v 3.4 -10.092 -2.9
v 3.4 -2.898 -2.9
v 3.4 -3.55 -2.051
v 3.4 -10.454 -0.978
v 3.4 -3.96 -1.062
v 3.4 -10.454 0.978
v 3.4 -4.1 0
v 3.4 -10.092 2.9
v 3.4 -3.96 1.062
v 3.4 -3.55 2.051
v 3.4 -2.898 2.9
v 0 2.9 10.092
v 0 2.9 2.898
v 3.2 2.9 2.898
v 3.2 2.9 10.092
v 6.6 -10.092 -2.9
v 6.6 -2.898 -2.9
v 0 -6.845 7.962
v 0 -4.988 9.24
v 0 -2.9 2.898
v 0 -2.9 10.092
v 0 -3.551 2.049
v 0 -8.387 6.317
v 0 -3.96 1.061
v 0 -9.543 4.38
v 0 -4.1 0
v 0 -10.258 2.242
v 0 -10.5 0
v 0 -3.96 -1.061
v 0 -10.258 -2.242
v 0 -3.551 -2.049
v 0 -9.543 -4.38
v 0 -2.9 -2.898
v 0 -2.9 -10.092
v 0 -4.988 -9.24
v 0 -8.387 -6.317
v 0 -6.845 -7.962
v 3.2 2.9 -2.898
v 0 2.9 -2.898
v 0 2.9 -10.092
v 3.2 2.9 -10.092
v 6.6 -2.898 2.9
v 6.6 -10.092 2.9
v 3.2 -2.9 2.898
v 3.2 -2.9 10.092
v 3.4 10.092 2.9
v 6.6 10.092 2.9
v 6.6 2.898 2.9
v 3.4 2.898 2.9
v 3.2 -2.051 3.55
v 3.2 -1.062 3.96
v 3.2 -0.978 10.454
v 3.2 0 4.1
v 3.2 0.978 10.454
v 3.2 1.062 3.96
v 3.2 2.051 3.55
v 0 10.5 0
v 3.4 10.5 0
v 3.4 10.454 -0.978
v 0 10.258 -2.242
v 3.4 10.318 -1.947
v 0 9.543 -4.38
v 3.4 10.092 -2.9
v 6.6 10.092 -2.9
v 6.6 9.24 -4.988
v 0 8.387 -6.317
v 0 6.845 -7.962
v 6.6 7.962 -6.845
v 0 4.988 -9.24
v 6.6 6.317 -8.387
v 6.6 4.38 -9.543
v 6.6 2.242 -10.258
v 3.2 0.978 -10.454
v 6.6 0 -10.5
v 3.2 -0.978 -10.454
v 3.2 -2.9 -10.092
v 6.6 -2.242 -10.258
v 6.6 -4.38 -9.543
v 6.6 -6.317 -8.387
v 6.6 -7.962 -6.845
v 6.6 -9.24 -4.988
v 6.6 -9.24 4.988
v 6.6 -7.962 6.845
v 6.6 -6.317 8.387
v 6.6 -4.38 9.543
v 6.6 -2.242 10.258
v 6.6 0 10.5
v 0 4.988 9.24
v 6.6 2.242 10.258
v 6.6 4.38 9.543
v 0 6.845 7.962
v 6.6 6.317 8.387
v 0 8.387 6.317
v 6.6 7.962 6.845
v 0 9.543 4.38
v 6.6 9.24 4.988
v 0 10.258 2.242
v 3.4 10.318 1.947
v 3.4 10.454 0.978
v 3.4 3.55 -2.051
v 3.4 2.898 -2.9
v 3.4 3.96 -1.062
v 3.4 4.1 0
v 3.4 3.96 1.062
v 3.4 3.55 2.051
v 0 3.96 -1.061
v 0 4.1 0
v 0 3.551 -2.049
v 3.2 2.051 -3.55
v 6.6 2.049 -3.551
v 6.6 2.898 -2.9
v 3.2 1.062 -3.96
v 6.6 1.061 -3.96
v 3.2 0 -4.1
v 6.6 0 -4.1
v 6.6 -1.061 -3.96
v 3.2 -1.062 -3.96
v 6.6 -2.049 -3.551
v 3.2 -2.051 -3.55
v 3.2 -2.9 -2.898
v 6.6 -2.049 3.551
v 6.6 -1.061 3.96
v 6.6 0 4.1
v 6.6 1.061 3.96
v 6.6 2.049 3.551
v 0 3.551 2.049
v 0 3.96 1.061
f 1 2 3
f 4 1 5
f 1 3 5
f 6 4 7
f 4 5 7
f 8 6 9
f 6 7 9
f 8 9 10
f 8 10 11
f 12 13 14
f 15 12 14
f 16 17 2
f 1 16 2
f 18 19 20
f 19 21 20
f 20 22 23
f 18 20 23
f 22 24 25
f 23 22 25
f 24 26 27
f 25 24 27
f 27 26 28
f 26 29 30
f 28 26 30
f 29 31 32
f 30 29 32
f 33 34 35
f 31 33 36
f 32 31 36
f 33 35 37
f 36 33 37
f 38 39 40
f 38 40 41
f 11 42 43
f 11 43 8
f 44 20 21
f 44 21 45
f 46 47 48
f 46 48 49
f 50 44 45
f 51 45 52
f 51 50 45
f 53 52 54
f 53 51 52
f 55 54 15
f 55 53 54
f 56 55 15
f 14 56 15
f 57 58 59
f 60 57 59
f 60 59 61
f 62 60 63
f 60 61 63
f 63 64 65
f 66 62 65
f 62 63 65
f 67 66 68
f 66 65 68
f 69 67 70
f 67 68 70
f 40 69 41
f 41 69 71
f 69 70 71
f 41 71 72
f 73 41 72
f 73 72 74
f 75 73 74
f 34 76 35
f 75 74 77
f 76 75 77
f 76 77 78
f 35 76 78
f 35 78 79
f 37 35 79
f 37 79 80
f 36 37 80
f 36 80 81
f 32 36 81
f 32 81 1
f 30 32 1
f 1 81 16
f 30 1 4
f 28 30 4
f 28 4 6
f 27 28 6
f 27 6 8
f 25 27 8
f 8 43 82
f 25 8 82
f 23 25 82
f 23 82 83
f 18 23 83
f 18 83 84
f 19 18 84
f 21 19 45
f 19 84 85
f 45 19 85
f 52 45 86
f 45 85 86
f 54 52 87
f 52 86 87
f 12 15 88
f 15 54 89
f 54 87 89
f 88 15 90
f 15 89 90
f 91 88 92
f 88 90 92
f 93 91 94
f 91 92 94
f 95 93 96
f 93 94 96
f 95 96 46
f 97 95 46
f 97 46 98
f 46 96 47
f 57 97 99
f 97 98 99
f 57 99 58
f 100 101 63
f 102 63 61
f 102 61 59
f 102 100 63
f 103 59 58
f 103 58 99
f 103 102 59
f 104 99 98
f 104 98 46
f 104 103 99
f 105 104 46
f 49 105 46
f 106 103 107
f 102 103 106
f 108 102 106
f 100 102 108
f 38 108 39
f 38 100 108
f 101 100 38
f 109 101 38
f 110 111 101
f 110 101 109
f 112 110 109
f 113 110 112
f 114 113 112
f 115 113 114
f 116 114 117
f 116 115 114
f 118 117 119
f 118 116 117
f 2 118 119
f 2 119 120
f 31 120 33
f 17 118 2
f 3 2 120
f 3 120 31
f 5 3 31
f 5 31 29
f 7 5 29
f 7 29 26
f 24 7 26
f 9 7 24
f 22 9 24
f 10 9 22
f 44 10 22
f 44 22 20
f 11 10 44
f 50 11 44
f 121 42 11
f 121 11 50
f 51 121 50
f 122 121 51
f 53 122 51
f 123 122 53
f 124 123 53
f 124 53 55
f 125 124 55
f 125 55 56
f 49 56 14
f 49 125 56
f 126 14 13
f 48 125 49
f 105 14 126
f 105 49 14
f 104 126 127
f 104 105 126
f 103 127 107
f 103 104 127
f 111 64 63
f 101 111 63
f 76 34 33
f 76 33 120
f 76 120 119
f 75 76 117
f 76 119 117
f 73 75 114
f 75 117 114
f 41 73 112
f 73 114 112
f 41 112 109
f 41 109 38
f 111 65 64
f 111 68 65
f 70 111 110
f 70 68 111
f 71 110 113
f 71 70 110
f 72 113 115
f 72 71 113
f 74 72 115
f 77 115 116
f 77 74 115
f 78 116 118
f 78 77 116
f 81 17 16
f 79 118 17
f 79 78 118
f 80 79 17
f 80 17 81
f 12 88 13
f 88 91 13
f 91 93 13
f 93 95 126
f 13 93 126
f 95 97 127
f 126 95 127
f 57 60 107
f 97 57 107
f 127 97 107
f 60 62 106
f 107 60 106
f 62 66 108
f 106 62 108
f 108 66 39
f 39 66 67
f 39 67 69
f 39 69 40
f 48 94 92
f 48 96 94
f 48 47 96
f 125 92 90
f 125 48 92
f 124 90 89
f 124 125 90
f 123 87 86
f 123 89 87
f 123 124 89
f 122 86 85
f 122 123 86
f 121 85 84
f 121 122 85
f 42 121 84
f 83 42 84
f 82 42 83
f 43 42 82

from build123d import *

# Parameters (mm, degrees)
SKETCH1_W               = 6.6
SKETCH1_H               = 6.4
CUT_EXTRUDE1_DEPTH      = 10.5
CUT_EXTRUDE1_DEPTH_BACK = 10.5
SKETCH2_W               = 3.2
SKETCH2_H               = 5.8
CUT_EXTRUDE2_DEPTH      = 10.5
CUT_EXTRUDE2_DEPTH_BACK = 10.5
SKETCH3_W               = 3.2
SKETCH3_H               = 5.8


with BuildPart() as part:
    # Sketch1 → Revolve1 (revolve)
    with BuildSketch(Plane.XY):
        with Locations((3.3, 7.3)):
            Rectangle(SKETCH1_W, SKETCH1_H)
    revolve(axis=Axis((6.6, 0, 0), (-1, 0, 0)))

    # Sketch2 → Cut-Extrude1 (cut, two sides: drawn at the far end of the back side and taken through both)
    with BuildSketch(Plane.XY.offset(-CUT_EXTRUDE1_DEPTH_BACK)):
        with Locations((1.6, 0)):
            Rectangle(SKETCH2_W, SKETCH2_H)
    extrude(amount=CUT_EXTRUDE1_DEPTH + CUT_EXTRUDE1_DEPTH_BACK, mode=Mode.SUBTRACT)

    # Sketch3 → Cut-Extrude2 (cut, two sides: drawn at the far end of the back side and taken through both)
    with BuildSketch(Plane(origin=(0, 0, 0), x_dir=(-1, 0, 0), z_dir=(0, 1, 0)).offset(-CUT_EXTRUDE2_DEPTH_BACK)):
        with Locations((-5, 0)):
            Rectangle(SKETCH3_W, SKETCH3_H)
    extrude(amount=CUT_EXTRUDE2_DEPTH + CUT_EXTRUDE2_DEPTH_BACK, mode=Mode.SUBTRACT)


solid = part.part
